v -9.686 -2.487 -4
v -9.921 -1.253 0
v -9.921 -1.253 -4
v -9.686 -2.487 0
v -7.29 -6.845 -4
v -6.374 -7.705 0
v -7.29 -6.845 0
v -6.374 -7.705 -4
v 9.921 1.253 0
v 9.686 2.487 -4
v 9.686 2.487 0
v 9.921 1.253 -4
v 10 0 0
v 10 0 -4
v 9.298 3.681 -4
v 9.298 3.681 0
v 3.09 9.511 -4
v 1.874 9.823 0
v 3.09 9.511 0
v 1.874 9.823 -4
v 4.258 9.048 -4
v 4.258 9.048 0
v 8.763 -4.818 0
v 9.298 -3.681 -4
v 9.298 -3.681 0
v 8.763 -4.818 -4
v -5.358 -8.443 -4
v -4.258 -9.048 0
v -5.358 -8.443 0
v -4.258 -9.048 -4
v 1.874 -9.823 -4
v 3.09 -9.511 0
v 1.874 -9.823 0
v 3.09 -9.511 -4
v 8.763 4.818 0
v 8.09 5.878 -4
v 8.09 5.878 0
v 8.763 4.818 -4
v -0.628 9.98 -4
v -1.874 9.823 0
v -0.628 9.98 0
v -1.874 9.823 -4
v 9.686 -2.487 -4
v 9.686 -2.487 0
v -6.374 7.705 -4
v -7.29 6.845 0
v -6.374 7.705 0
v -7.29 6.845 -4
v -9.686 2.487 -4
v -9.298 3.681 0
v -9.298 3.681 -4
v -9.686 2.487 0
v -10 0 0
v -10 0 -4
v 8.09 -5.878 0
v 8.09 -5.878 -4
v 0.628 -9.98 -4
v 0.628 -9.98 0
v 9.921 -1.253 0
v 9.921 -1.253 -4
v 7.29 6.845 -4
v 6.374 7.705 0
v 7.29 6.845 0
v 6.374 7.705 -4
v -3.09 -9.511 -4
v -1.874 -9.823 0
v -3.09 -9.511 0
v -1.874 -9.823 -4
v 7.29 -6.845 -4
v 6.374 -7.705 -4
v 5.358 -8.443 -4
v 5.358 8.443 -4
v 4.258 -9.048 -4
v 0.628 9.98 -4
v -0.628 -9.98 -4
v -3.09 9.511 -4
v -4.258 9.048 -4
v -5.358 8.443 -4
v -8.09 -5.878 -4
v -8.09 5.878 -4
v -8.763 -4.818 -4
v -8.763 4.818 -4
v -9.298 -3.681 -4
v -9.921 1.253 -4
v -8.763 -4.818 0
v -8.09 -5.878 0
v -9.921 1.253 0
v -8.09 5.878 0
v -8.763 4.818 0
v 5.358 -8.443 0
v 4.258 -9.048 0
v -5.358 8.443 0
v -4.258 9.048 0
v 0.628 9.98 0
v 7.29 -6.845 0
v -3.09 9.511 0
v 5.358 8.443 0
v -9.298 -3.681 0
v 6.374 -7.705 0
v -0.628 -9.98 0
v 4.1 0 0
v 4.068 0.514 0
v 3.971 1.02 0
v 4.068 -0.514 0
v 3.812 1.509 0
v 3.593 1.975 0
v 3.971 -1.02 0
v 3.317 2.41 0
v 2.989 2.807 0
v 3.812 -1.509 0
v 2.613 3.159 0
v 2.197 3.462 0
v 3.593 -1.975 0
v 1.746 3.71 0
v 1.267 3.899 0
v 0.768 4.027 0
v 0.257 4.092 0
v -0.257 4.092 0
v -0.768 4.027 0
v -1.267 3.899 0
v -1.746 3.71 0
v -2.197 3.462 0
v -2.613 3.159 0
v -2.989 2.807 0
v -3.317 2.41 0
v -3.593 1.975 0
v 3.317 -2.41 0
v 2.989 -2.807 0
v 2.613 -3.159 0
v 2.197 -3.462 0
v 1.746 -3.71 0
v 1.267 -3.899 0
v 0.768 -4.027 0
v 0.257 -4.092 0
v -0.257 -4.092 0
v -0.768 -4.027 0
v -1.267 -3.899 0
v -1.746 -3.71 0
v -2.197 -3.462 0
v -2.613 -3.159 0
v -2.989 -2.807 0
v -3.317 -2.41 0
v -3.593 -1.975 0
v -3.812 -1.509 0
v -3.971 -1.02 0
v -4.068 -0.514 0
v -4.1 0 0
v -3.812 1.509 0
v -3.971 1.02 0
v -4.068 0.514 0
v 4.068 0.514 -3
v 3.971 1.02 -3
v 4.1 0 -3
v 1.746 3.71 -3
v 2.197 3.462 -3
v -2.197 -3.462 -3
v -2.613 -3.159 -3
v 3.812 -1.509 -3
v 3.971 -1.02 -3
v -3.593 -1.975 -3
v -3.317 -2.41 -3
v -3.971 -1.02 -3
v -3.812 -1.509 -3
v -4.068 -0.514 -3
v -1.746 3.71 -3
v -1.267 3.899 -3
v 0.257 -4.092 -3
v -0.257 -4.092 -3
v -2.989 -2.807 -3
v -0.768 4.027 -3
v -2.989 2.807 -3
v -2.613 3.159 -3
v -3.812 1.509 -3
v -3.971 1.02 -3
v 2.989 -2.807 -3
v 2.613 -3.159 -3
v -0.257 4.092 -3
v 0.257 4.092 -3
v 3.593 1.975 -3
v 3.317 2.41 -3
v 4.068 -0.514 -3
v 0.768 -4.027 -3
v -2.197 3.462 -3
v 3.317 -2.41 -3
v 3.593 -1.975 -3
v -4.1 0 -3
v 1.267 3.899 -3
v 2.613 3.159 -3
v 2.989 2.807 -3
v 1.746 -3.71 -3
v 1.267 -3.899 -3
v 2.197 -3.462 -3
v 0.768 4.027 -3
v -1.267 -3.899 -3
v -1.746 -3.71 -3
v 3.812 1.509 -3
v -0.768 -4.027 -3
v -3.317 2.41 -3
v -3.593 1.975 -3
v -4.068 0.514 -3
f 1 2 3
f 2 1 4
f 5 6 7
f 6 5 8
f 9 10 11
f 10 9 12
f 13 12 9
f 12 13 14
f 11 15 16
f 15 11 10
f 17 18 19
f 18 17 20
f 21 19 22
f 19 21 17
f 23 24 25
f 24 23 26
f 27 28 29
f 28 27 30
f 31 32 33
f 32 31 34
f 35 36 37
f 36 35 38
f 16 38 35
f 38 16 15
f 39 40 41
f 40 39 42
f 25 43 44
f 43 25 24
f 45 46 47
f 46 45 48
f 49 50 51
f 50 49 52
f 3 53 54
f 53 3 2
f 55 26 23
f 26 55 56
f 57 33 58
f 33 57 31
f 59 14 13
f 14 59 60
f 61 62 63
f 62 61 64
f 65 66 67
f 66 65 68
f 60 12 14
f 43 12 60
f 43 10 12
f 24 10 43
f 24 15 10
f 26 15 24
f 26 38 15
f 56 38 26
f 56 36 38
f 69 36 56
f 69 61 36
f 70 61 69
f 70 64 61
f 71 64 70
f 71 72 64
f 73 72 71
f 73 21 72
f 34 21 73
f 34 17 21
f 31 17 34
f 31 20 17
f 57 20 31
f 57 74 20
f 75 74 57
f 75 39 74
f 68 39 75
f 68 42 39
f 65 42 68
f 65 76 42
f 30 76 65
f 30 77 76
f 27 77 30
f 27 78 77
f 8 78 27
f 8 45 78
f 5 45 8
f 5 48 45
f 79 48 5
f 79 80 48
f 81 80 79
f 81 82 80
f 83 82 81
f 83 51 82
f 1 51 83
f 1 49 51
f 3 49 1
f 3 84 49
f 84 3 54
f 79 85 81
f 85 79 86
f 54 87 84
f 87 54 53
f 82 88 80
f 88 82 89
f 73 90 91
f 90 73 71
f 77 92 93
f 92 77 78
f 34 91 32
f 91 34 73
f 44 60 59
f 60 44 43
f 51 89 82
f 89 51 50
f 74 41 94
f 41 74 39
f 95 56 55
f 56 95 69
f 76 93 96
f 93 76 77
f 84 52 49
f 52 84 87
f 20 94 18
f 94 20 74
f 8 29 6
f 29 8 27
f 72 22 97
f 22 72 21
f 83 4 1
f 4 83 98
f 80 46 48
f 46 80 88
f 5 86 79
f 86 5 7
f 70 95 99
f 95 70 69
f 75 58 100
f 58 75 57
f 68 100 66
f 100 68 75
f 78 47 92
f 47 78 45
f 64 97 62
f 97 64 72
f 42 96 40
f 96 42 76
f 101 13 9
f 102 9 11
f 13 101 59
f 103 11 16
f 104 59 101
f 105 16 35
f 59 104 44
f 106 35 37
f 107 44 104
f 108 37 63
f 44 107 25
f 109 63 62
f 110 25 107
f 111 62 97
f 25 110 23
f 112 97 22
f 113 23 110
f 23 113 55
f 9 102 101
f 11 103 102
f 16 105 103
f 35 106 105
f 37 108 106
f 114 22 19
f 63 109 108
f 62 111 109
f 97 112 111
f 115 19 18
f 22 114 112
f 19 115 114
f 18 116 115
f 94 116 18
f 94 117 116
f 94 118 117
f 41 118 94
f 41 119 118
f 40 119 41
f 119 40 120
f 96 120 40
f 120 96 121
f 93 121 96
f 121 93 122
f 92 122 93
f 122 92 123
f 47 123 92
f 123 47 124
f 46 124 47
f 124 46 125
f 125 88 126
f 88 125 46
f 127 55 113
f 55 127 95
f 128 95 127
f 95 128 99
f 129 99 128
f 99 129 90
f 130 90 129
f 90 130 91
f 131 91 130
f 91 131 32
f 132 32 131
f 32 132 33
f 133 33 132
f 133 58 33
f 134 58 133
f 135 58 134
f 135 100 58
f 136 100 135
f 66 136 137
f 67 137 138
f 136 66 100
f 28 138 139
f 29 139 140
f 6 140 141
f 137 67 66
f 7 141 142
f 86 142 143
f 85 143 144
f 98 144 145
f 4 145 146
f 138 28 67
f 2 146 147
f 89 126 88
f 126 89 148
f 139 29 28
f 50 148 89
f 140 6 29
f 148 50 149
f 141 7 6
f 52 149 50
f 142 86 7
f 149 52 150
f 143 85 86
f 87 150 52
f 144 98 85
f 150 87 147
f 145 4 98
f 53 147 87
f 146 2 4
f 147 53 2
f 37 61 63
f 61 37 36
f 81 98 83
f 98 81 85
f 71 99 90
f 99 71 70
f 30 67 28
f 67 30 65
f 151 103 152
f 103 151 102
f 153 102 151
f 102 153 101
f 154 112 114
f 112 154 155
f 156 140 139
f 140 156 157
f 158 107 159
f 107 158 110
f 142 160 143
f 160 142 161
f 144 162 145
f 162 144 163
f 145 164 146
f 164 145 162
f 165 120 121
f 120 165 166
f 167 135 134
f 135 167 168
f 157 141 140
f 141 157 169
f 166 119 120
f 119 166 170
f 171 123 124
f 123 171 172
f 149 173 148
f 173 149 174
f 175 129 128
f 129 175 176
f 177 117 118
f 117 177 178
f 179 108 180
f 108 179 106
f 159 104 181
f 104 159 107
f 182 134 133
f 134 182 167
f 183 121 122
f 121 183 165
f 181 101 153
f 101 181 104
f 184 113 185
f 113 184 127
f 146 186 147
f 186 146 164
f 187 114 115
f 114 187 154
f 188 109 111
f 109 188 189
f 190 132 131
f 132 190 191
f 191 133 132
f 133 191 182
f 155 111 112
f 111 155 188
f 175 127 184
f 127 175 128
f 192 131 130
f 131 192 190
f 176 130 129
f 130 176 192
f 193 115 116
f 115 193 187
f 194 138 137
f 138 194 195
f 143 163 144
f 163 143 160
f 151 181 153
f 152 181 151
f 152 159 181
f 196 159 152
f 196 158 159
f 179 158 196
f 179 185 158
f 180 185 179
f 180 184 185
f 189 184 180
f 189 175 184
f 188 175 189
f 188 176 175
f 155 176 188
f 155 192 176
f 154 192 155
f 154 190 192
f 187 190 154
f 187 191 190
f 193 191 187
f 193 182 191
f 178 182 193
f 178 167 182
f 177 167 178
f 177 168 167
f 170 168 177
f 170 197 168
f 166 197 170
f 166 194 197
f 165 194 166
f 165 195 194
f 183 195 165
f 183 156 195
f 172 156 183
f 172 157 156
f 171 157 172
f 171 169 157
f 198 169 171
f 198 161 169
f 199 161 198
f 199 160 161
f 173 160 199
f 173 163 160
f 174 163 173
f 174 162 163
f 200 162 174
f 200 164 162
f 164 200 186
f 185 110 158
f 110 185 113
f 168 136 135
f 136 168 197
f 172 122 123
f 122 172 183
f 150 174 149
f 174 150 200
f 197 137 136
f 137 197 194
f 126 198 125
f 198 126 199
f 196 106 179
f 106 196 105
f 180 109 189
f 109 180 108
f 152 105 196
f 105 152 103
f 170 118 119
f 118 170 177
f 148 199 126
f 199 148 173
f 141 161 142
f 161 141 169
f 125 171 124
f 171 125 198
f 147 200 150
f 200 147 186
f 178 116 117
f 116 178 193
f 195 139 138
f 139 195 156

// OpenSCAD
$fn = 50;


difference() {
	union() {
		translate(v = [0, 0, -4.0000000000]) {
			cylinder(h = 4, r = 10.0000000000);
		}
	}
	union() {
		#translate(v = [0, 0, -3.0000000000]) {
			cylinder(h = 3, r = 4.1000000000);
		}
	}
}
